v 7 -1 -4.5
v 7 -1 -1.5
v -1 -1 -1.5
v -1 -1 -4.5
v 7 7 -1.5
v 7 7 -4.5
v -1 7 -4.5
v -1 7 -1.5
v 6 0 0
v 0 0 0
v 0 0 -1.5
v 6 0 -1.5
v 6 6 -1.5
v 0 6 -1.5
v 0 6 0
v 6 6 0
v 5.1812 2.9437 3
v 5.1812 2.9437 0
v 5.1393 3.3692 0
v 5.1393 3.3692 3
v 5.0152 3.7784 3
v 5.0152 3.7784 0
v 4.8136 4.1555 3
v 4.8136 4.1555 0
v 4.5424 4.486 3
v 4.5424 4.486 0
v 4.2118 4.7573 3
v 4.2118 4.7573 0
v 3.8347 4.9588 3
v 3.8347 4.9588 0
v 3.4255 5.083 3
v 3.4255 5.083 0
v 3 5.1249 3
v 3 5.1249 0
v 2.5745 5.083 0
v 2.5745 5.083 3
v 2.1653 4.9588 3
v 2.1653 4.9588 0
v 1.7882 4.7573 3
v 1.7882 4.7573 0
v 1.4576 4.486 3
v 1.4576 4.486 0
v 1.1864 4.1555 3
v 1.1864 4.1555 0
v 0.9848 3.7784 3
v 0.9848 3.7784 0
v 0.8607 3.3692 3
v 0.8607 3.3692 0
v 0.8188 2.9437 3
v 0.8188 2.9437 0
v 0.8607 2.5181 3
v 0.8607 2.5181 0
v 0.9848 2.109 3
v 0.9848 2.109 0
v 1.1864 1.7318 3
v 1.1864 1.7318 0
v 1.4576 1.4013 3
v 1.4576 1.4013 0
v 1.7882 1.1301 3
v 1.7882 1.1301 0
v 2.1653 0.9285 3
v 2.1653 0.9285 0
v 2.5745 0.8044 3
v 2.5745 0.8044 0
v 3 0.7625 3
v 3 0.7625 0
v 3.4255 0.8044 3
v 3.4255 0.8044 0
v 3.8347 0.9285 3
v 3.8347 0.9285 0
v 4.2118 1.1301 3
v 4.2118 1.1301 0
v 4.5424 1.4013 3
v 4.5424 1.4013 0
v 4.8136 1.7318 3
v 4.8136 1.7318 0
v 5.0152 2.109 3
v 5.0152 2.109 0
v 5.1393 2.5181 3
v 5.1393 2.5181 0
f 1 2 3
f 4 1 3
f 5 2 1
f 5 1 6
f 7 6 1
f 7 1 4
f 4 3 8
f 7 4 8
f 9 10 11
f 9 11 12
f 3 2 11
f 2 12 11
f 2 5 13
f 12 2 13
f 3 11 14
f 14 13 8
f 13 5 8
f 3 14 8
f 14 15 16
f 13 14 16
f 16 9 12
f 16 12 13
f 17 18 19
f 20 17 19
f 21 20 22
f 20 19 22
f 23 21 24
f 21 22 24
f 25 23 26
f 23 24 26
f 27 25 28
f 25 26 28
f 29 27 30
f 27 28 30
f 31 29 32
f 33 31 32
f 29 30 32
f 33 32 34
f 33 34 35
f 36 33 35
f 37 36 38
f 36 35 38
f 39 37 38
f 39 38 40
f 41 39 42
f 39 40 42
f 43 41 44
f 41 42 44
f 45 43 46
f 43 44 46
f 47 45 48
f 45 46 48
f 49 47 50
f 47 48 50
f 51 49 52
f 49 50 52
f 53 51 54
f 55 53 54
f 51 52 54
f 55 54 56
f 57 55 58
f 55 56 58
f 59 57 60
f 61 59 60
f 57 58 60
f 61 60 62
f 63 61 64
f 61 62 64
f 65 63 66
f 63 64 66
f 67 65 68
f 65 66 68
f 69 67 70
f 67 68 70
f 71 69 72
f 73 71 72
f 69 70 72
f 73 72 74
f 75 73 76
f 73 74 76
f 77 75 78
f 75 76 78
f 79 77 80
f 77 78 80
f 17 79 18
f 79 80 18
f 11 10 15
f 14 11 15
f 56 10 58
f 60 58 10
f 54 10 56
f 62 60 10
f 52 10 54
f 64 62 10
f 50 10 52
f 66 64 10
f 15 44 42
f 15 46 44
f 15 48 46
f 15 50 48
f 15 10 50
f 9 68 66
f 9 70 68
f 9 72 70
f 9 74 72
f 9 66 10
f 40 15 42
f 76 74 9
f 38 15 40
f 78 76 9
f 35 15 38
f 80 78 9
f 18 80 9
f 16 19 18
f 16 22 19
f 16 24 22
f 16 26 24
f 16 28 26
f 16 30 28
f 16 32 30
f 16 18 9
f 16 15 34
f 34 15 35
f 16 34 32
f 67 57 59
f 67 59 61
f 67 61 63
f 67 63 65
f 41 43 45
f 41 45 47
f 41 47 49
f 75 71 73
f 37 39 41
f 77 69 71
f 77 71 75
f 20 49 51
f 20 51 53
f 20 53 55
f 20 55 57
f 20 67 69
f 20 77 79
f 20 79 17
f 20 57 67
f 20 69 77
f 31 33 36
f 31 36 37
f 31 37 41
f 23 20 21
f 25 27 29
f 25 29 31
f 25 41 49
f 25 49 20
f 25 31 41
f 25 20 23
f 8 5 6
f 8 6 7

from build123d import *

# Parameters (mm, degrees)
SKETCH1_W           = 6
SKETCH1_H           = 6
BOSS_EXTRUDE1_DEPTH = 1.5
SKETCH2_R           = 2.181214146
BOSS_EXTRUDE2_DEPTH = 3
SKETCH4_W           = 8
SKETCH4_H           = 8
BOSS_EXTRUDE3_DEPTH = 3


with BuildPart() as part:
    # Sketch1 → Boss-Extrude1 (new body)
    with BuildSketch(Plane.XY):
        with Locations((3, 3)):
            Rectangle(SKETCH1_W, SKETCH1_H)
    extrude(amount=-BOSS_EXTRUDE1_DEPTH)

    # Sketch2 → Boss-Extrude2 (add)
    with BuildSketch(Plane.XY):
        with Locations((3, 2.94366618)):
            Circle(SKETCH2_R)
    extrude(amount=BOSS_EXTRUDE2_DEPTH)

    # Sketch4 → Boss-Extrude3 (add)
    with BuildSketch(Plane(origin=(0, 0, -1.5), x_dir=(-1, 0, 0), z_dir=(0, 0, -1))):
        with Locations((-3, 3)):
            Rectangle(SKETCH4_W, SKETCH4_H)
    extrude(amount=BOSS_EXTRUDE3_DEPTH)


solid = part.part
